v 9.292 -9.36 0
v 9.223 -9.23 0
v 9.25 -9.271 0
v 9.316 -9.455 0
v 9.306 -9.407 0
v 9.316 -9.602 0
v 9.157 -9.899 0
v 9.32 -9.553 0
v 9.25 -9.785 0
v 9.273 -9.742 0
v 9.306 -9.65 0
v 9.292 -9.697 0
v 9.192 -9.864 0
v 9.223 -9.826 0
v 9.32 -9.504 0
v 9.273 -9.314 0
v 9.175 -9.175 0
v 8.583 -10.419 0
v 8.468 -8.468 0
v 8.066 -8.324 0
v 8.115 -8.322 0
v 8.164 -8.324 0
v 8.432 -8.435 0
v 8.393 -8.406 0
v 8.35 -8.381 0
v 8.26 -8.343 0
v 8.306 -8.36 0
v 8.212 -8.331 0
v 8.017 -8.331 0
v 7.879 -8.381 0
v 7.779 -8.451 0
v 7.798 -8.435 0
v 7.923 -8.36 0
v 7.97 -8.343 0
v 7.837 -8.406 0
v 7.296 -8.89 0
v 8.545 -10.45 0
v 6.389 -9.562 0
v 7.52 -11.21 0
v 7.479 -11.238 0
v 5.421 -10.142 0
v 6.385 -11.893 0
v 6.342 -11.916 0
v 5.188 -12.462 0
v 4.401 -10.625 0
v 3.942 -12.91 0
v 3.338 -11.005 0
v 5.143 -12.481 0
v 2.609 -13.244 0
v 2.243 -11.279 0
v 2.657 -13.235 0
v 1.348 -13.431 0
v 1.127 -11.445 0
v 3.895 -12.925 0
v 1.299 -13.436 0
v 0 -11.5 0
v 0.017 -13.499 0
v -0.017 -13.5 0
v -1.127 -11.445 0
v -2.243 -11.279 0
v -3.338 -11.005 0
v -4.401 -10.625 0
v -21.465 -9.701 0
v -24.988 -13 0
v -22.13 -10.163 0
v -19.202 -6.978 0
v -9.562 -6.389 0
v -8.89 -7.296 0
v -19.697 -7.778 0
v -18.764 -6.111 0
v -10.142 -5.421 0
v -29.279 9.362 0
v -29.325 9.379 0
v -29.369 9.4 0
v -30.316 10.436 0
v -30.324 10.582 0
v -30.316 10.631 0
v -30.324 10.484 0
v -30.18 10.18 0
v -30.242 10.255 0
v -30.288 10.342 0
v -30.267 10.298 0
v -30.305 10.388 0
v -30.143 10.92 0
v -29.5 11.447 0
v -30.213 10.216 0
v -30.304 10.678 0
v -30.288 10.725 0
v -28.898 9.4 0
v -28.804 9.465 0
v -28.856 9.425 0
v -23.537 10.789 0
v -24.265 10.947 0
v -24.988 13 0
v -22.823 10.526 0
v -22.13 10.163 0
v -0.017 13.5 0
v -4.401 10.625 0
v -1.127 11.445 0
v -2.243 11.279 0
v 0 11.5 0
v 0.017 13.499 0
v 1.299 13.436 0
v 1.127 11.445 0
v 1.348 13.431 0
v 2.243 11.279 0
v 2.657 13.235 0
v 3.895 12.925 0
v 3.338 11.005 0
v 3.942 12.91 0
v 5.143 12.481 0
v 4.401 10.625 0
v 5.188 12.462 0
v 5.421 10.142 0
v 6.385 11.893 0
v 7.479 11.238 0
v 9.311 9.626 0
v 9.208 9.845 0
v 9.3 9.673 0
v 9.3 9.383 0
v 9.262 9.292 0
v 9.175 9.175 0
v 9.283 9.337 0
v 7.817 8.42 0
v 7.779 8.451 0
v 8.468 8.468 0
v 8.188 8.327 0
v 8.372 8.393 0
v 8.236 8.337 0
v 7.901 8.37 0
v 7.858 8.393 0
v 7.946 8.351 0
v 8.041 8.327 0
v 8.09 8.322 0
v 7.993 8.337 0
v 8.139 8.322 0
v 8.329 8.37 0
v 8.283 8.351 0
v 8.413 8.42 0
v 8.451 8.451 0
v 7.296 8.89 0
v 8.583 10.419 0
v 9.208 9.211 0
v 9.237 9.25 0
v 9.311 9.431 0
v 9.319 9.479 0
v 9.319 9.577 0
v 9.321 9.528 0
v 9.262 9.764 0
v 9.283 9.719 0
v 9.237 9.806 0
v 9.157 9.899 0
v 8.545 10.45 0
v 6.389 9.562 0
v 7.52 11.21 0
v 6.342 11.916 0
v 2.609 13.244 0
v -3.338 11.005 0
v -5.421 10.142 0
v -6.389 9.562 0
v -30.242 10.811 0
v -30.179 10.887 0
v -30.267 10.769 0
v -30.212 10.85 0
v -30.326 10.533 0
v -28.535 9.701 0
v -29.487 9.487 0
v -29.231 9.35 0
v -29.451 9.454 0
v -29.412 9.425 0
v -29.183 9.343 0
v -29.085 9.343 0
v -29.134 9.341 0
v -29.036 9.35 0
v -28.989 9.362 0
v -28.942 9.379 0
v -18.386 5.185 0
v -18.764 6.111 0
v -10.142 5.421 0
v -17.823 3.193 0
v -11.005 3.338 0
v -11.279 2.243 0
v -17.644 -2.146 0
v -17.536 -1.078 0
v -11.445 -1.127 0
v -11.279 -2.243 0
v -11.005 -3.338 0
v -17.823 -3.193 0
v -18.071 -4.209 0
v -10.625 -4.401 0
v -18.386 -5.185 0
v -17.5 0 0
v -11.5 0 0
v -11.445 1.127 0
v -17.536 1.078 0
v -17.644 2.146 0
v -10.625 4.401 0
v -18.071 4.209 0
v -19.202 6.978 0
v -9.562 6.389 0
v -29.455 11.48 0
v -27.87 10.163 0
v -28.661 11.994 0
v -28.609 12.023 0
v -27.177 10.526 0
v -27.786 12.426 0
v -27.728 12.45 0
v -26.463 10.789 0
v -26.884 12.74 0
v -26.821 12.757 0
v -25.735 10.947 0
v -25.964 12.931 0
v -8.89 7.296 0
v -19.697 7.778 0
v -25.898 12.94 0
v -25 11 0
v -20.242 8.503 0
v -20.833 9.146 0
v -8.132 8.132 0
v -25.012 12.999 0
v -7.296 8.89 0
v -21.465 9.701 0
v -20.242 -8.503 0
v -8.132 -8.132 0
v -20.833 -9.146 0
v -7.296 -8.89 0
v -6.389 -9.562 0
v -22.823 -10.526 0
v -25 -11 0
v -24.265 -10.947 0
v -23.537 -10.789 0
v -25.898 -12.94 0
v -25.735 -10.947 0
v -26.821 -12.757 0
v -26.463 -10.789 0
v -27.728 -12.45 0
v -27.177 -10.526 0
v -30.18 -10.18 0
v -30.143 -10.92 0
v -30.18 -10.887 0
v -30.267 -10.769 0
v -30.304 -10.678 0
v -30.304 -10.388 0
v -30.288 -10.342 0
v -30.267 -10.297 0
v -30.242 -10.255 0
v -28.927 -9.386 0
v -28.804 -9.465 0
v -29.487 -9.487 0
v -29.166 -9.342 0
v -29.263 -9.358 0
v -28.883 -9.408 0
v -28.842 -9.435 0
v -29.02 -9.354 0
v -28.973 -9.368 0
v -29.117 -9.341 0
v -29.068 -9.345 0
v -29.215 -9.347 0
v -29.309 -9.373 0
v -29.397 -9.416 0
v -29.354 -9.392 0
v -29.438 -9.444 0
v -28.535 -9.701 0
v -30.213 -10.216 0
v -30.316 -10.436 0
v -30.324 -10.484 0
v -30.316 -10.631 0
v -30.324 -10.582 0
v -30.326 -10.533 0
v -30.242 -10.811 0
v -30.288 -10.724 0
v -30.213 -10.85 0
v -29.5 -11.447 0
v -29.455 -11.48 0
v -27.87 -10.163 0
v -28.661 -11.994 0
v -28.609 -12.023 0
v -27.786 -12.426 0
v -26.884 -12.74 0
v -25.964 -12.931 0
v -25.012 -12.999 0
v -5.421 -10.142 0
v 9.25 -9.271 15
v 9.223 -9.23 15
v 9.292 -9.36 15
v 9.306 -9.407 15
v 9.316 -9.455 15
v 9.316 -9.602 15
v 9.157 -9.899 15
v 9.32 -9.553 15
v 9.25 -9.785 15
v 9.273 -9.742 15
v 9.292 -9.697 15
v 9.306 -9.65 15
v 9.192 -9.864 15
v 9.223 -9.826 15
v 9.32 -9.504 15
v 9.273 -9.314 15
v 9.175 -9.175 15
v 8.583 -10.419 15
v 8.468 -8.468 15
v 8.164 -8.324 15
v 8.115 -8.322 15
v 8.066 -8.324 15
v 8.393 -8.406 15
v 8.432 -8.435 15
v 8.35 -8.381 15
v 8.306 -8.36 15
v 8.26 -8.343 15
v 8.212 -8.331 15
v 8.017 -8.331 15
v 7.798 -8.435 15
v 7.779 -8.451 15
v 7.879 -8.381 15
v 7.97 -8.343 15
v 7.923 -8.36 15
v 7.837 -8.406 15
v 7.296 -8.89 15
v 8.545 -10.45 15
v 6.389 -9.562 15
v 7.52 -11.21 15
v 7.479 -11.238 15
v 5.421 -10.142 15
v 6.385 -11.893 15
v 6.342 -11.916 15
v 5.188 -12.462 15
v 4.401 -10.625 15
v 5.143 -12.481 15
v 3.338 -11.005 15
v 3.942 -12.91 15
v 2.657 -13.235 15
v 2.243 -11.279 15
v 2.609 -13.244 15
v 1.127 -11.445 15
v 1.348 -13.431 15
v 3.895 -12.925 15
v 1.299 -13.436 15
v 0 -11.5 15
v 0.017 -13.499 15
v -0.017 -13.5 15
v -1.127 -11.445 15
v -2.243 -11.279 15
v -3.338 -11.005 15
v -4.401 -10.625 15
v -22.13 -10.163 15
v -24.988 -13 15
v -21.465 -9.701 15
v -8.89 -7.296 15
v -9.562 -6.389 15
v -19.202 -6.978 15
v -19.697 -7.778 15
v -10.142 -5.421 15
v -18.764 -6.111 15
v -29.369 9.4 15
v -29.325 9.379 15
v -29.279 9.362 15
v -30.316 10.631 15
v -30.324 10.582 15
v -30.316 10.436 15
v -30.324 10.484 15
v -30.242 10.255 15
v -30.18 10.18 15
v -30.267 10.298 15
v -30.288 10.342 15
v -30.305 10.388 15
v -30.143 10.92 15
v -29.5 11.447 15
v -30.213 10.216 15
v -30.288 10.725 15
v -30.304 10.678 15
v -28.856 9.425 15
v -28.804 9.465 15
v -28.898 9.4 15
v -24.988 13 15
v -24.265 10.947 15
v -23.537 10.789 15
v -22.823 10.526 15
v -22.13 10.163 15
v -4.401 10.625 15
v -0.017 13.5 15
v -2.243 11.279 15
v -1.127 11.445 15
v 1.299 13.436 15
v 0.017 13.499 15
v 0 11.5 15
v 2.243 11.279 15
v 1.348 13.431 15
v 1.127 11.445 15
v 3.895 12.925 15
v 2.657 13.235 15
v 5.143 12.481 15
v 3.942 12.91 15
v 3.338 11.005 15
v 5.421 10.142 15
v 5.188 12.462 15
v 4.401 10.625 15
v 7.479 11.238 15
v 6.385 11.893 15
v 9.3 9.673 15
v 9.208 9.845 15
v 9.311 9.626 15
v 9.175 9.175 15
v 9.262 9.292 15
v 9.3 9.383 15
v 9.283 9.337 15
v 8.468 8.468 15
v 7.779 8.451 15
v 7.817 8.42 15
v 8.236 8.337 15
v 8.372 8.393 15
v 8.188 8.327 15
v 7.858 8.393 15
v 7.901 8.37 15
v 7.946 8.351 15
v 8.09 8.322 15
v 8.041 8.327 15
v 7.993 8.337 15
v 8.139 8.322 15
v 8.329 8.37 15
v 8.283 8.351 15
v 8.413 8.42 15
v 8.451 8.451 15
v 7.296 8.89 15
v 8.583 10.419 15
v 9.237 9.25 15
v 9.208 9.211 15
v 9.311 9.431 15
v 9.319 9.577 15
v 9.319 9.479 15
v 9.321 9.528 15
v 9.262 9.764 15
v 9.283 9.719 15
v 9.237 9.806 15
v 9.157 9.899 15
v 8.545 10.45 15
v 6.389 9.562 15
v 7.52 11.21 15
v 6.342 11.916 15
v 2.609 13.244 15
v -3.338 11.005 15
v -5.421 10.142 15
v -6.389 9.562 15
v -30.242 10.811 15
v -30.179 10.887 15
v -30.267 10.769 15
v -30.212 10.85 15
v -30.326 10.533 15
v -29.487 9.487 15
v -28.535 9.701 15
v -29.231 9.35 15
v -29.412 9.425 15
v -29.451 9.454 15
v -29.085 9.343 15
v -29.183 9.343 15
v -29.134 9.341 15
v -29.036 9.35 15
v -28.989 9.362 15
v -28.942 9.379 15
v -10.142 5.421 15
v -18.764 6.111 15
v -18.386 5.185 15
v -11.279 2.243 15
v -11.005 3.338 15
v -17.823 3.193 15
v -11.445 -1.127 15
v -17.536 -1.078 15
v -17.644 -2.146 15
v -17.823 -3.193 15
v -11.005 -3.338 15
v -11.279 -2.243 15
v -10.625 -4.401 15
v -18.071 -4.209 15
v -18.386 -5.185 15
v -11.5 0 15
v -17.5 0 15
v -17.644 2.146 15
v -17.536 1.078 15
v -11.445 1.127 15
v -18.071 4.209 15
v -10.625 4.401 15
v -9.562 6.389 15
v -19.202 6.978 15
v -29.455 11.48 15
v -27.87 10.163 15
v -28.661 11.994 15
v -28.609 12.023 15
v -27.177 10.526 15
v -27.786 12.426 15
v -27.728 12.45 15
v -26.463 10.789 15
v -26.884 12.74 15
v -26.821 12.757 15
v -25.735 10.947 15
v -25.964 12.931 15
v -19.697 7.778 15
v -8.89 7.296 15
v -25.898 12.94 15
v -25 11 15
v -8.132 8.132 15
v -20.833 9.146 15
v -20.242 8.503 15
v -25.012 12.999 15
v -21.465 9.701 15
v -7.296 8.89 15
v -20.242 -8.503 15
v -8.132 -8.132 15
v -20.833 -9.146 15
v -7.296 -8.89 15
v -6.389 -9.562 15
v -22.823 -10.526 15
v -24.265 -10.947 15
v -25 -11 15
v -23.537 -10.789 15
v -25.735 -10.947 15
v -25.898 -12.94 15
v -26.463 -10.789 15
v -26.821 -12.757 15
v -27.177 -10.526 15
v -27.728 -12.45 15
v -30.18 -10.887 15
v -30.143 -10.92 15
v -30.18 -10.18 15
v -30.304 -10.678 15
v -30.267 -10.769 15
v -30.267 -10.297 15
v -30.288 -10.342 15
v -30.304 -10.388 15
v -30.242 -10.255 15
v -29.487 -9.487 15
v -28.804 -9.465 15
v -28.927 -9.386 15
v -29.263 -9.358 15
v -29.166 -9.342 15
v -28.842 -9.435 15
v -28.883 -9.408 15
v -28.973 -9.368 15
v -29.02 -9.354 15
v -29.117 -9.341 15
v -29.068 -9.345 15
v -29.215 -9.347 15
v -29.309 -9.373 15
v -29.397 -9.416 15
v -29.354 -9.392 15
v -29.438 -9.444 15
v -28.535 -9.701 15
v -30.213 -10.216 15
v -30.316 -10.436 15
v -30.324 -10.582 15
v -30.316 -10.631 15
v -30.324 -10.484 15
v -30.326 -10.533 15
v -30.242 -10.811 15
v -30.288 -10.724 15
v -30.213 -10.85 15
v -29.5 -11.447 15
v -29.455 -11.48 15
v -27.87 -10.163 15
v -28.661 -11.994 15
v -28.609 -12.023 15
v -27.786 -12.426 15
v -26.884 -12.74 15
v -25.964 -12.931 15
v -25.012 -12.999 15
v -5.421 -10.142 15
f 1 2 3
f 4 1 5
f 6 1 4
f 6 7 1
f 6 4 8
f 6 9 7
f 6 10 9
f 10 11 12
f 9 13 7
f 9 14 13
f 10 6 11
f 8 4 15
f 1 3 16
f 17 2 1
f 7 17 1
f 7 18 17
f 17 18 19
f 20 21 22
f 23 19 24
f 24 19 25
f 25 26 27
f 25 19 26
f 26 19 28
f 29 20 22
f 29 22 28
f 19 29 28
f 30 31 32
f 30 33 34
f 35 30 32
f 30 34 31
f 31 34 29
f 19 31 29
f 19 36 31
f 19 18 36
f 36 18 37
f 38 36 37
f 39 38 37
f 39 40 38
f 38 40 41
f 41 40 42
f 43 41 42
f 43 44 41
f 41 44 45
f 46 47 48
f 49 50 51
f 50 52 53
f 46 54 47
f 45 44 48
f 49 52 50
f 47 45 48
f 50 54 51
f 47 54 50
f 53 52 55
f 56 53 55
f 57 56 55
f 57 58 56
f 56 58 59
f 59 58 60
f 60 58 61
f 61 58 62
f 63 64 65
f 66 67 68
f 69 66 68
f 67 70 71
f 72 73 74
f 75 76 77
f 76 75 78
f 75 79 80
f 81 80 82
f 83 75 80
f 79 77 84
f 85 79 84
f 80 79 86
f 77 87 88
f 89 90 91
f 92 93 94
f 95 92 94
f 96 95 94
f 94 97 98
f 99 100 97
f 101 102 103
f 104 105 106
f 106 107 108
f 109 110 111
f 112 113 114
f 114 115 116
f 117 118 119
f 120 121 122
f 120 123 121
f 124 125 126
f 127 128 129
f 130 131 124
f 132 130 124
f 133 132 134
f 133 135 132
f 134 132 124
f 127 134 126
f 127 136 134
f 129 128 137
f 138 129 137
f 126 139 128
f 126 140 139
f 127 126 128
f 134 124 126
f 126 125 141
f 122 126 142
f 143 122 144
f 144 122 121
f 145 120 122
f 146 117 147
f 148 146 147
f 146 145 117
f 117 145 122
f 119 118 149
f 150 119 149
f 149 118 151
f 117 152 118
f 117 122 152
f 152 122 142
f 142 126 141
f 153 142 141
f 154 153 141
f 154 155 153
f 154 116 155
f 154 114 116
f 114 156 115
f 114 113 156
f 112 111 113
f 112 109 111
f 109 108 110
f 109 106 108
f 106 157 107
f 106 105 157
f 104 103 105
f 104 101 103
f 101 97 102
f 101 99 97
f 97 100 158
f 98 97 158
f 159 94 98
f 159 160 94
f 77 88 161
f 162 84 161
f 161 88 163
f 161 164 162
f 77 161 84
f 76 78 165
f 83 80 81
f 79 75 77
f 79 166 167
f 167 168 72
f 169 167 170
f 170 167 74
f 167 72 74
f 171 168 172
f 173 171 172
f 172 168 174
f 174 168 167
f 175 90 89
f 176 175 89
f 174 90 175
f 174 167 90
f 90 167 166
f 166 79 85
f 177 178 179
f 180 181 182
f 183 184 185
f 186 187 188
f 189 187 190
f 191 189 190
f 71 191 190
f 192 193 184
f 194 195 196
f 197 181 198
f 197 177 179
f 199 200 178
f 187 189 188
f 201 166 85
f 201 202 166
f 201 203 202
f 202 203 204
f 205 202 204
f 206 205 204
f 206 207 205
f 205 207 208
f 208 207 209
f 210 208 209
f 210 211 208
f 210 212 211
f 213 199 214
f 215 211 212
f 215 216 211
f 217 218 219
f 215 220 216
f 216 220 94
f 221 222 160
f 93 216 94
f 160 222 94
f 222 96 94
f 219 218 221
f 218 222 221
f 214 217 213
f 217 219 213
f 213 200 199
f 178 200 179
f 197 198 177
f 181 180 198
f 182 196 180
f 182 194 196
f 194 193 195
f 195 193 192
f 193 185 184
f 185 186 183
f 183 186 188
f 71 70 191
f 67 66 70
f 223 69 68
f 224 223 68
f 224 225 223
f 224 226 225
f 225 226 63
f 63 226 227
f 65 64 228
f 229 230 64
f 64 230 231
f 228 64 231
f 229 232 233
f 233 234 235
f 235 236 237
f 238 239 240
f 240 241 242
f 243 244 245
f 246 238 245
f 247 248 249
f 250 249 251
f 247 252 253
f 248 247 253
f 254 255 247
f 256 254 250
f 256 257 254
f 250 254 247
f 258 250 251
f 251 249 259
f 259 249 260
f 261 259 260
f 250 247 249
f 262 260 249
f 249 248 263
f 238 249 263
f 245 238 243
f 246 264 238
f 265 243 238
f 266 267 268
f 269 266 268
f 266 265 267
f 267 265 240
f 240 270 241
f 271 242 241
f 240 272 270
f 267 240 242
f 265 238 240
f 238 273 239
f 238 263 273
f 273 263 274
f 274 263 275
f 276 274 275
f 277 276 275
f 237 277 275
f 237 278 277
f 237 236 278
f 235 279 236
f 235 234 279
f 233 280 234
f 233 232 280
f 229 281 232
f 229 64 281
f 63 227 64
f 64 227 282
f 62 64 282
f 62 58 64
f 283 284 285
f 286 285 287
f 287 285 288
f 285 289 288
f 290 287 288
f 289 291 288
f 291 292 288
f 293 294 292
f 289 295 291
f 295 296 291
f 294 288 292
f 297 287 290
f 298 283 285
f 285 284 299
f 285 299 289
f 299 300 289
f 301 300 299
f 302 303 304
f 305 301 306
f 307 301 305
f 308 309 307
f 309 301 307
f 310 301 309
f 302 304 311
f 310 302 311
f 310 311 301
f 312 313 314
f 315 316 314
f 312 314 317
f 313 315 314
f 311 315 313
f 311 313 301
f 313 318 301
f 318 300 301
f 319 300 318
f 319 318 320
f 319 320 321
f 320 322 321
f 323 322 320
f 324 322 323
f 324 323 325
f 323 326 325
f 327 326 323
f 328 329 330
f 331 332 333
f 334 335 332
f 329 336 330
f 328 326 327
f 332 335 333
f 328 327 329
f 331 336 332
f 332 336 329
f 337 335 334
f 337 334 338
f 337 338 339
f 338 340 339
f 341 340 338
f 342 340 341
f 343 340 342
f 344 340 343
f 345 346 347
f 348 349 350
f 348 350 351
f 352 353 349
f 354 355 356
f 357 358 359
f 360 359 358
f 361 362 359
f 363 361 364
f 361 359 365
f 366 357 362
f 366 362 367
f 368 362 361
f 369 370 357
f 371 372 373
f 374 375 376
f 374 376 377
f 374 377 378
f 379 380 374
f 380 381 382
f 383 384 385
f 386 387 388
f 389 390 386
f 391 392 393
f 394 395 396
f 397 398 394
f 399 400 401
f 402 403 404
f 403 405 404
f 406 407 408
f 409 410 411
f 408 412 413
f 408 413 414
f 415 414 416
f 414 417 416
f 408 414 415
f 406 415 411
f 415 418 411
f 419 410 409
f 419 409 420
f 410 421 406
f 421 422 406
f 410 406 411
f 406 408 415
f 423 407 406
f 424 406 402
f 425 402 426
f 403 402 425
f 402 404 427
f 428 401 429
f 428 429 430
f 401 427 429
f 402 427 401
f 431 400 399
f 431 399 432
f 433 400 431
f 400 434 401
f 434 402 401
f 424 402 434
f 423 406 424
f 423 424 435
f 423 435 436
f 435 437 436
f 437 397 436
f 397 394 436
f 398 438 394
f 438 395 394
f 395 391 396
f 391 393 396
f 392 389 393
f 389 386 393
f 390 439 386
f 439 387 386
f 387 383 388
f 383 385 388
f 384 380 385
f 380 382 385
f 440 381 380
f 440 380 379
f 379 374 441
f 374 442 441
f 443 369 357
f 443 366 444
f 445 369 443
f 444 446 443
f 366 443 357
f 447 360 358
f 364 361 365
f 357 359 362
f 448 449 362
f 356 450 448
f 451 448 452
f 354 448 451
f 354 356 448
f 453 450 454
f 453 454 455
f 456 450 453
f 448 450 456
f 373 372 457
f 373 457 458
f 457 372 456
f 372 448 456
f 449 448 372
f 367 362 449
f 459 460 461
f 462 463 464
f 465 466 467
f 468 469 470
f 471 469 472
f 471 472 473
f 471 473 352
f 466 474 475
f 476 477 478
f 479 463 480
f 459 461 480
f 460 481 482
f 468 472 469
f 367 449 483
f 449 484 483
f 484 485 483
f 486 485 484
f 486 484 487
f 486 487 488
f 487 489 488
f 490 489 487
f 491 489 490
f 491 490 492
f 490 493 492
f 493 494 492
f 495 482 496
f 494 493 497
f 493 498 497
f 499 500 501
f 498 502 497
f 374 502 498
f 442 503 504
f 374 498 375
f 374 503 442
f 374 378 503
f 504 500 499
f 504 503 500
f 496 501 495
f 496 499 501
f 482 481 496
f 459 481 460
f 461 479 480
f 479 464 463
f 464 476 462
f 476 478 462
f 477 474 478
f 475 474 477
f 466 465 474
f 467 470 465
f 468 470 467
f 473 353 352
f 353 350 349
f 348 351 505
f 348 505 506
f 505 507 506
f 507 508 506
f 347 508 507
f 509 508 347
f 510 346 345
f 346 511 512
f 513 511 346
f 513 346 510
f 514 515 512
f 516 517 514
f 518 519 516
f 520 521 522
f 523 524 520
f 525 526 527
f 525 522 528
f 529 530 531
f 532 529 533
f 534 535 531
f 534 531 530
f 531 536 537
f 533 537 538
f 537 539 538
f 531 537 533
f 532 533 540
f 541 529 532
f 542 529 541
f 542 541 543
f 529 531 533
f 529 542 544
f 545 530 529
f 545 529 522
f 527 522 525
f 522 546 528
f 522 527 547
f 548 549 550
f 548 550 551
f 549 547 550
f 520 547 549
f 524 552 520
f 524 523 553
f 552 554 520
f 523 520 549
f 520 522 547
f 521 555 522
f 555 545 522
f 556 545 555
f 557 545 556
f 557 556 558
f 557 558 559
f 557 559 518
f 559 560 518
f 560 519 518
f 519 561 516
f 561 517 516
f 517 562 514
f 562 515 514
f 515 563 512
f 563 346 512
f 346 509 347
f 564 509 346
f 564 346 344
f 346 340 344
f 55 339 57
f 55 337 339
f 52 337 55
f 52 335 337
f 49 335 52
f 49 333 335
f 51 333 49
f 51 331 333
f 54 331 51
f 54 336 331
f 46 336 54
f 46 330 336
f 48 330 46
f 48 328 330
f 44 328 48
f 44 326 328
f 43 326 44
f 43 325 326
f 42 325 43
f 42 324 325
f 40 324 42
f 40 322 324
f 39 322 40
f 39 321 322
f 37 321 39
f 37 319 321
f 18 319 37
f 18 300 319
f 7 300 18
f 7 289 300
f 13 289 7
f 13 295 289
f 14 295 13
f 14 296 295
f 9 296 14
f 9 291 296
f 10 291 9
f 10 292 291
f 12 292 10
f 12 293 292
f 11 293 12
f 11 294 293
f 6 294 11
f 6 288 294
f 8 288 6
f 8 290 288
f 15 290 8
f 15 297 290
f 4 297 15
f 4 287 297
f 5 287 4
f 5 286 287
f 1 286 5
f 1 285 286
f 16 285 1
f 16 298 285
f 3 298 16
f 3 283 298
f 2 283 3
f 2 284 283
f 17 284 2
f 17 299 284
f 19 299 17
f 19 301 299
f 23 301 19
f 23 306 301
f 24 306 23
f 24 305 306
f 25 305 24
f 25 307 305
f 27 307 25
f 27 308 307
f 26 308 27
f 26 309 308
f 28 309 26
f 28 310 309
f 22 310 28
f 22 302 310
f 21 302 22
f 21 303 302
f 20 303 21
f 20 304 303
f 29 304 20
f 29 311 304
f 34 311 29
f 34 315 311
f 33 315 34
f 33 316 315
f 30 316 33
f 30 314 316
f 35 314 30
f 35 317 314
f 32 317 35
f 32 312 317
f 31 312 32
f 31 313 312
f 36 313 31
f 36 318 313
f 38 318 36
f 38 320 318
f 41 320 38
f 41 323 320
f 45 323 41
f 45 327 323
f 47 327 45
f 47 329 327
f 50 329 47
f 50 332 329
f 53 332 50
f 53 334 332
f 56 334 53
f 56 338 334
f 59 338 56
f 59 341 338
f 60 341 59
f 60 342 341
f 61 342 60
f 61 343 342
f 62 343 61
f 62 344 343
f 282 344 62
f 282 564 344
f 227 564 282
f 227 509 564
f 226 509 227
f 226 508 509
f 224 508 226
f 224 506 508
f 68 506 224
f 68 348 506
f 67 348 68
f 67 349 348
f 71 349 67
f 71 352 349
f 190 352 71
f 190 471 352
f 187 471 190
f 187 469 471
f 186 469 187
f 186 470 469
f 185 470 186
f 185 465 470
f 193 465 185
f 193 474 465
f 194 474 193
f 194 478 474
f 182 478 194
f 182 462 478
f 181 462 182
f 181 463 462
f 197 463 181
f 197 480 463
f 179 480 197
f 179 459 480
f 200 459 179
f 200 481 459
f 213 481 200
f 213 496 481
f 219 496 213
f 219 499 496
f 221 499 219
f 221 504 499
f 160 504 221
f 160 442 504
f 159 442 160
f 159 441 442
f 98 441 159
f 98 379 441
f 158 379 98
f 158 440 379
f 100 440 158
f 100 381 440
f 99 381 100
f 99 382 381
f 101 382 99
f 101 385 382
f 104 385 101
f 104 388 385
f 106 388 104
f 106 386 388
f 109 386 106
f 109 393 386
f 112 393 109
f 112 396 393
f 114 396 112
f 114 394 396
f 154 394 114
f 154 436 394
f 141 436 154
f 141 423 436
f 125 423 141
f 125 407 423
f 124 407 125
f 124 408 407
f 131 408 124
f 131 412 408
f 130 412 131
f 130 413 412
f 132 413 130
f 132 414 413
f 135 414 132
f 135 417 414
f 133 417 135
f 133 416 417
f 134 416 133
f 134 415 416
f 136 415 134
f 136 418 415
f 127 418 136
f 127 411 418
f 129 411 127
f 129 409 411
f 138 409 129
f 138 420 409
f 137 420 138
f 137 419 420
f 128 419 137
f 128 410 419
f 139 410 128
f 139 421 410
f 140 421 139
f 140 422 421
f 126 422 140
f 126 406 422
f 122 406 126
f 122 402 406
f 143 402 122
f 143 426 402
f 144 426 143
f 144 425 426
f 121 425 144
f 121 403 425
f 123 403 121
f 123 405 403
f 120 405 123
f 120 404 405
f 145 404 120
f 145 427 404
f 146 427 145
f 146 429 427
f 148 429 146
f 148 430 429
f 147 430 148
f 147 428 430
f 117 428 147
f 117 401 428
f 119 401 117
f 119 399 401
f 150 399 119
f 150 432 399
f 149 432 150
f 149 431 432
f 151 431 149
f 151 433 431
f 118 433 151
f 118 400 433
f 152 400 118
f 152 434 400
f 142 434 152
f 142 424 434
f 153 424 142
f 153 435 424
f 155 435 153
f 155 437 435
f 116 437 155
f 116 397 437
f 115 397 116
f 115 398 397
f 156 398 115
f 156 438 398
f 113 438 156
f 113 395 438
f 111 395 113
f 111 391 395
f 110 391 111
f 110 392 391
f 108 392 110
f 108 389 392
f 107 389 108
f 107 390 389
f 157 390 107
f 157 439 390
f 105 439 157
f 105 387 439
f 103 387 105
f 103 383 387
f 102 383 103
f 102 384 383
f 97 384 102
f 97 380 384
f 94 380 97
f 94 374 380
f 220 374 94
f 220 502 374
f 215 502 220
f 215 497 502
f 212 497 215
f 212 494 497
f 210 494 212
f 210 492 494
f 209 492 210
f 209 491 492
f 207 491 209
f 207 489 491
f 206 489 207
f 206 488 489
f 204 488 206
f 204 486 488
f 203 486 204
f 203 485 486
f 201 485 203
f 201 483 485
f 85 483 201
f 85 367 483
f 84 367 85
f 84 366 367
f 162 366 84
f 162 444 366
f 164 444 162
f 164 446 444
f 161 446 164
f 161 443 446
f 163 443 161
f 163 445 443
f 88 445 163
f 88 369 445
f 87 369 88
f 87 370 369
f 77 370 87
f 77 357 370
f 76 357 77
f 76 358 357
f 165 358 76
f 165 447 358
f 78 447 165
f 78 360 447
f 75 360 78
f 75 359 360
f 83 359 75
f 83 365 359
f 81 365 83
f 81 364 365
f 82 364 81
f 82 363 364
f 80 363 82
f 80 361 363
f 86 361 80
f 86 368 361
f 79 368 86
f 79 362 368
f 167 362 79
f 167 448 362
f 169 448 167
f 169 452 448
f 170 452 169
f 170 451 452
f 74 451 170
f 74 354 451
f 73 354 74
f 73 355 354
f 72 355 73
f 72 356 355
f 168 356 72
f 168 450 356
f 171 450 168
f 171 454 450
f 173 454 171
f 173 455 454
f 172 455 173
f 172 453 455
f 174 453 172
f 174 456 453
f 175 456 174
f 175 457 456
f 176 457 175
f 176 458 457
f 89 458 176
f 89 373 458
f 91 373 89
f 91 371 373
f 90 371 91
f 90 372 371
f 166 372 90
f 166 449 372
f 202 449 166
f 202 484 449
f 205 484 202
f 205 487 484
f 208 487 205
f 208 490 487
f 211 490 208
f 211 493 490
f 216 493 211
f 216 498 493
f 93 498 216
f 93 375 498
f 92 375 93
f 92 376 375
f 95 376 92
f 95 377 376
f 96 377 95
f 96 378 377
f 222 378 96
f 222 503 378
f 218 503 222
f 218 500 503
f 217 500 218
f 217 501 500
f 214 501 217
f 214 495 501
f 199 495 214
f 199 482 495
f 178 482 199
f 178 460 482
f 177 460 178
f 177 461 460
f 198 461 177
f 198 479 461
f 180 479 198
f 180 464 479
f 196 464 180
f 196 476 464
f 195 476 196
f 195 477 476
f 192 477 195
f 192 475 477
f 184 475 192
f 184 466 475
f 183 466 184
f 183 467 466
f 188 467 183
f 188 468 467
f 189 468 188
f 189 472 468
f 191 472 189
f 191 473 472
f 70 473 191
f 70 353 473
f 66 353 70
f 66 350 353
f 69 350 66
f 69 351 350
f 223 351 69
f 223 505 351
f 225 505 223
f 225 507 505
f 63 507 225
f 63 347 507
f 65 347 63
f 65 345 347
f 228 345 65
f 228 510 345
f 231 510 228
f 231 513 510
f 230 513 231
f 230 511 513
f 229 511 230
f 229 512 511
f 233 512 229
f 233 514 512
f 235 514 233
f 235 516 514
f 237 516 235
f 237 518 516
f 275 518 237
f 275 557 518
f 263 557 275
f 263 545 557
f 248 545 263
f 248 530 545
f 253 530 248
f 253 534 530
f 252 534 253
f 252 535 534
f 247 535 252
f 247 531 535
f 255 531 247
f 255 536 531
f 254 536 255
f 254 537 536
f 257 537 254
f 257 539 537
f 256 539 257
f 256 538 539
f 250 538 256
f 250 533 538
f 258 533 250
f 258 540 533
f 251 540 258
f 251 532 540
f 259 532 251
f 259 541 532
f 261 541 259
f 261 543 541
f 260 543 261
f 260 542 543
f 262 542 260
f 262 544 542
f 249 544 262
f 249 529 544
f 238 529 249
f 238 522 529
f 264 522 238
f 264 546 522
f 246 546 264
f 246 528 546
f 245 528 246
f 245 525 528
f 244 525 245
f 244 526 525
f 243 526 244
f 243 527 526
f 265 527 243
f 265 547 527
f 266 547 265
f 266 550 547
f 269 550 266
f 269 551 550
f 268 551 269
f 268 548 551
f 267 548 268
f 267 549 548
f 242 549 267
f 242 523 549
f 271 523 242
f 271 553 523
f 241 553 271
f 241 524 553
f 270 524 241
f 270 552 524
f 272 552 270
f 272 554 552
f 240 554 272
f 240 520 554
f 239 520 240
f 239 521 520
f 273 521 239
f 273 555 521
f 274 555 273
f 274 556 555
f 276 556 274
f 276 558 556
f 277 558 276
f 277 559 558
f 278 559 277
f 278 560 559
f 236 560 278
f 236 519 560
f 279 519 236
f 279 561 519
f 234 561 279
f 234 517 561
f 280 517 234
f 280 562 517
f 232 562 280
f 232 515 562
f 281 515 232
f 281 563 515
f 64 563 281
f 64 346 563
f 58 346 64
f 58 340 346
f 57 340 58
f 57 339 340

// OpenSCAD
rail_diam=23;
hb_width=22;
hb_depth=15;
collar_thickness=2;
$fn = 64;

//linear_extrude(2) {
//
//offset(r=-0.5) offset(r=0.5)
//difference() {
//  circle(d = rail_diam + collar_thickness);
//  circle(d = rail_diam);
//  polygon([[0,0],[20,20], [20,-20]]); 
//}
//
//
//
//translate([-20,0])
//difference() {
//  resize([hb_depth + collar_thickness, hb_width + collar_thickness]) circle();
//  resize([hb_depth, hb_width]) circle();
//  polygon([[0,0],[-20,20], [-20,-20]]); 
//}
//}


linear_extrude(15) {
offset(r=0.5) offset(delta=-0.5)
difference() {
  hull(){
      circle(d = rail_diam + 2*collar_thickness);
      translate([-25,0])
      resize([hb_depth + 2*collar_thickness, hb_width + 2*collar_thickness]) circle();
  }

  circle(d = rail_diam);
  polygon([[0,0],[20,20], [20,-20]]);
  
  translate([-25,0])
  resize([hb_depth, hb_width]) circle();
  polygon([[-20,0],[-40,20], [-40,-20]]); 
}
}
